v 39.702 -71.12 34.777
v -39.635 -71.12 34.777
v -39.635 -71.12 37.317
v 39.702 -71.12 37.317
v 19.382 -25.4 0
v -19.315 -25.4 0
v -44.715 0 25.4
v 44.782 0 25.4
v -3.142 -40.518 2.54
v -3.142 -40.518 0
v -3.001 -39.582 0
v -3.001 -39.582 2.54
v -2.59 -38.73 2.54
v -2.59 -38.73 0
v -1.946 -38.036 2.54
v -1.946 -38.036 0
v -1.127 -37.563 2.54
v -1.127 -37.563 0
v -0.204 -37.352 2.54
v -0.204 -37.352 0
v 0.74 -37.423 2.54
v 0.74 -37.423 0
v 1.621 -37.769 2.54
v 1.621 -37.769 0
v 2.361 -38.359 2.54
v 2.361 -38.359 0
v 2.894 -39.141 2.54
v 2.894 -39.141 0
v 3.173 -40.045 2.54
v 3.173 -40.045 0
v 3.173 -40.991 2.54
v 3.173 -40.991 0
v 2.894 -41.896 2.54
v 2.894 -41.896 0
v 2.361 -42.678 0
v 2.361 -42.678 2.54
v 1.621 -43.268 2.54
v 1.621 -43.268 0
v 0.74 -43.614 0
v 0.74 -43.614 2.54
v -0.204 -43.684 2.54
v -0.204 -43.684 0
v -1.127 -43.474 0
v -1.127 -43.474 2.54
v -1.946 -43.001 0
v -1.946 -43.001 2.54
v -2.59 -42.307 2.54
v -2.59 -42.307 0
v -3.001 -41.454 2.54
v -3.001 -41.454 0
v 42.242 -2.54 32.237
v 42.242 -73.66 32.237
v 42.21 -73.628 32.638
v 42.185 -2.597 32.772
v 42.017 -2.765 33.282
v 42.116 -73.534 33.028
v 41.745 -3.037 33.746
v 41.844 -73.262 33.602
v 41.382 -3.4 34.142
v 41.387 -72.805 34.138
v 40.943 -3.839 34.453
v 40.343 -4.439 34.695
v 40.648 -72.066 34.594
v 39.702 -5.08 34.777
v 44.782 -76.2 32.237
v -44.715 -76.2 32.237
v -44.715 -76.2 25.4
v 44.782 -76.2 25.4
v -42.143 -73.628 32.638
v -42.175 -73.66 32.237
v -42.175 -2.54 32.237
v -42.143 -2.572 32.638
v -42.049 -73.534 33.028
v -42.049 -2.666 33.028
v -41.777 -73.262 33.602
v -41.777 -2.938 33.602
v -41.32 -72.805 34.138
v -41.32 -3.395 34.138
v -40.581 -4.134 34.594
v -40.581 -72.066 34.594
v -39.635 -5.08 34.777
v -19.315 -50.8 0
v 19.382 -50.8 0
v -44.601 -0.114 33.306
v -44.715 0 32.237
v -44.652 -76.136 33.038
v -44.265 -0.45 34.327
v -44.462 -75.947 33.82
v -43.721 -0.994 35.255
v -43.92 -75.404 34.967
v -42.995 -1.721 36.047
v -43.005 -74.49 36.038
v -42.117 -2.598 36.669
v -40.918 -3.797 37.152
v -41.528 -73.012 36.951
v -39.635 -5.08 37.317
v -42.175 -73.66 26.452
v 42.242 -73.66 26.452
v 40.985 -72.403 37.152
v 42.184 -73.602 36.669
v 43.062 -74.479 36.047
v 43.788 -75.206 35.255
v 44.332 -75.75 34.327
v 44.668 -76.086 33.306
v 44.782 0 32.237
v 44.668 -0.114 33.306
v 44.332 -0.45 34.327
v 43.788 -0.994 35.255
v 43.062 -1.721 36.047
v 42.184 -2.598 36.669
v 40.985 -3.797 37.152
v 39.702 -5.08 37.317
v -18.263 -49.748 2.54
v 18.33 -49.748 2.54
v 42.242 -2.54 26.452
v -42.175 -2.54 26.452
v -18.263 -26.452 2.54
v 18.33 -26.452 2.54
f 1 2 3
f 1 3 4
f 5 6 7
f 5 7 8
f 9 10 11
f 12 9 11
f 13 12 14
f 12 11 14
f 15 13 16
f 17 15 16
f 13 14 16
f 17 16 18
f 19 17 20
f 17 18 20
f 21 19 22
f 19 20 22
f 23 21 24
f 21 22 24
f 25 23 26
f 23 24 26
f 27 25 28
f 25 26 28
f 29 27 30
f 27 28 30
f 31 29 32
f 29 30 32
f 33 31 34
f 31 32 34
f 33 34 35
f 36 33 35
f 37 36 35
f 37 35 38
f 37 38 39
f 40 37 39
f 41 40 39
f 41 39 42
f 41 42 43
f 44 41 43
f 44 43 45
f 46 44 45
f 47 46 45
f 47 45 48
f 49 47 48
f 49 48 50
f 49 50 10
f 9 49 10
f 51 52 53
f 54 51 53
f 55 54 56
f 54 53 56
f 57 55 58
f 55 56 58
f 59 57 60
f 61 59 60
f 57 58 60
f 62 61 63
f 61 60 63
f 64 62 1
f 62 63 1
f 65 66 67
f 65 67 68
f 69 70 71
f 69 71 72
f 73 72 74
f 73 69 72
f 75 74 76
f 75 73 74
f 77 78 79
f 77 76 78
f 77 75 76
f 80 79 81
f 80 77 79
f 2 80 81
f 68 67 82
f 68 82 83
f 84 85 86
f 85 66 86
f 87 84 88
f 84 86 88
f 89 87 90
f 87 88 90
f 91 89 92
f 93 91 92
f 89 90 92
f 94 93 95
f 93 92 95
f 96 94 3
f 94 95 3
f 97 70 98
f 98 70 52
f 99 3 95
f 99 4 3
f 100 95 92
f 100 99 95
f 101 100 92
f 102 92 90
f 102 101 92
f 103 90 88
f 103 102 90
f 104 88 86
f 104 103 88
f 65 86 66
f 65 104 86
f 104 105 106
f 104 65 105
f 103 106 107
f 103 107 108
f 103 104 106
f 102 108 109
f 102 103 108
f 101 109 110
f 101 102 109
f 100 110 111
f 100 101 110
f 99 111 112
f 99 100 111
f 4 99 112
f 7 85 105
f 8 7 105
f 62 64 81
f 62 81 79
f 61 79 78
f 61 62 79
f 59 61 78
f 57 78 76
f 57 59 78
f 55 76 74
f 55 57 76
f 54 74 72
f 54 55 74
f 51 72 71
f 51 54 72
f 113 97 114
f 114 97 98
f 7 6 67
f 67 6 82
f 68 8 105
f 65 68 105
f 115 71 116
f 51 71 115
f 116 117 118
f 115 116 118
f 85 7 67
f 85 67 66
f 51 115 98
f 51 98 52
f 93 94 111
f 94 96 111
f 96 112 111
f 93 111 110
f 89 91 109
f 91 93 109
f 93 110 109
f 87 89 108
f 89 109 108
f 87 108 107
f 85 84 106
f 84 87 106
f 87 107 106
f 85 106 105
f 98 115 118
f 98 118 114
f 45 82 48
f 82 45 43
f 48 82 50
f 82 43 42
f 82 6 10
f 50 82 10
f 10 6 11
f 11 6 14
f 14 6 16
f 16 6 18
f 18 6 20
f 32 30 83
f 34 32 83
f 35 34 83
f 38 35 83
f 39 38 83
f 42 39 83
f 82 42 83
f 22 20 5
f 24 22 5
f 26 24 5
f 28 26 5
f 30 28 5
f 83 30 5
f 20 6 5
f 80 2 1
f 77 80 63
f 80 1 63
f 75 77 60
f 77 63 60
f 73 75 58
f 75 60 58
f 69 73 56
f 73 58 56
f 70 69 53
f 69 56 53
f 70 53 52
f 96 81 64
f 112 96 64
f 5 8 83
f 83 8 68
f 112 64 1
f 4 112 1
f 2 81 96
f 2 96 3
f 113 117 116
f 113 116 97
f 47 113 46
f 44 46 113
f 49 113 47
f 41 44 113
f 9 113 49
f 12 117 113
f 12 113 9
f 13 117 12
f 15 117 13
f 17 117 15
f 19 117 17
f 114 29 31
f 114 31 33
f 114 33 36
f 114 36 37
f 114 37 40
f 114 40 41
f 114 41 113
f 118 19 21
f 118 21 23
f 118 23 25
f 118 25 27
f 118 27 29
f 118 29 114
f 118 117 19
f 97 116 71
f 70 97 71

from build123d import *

# Parameters (mm, degrees)
F0_W     = 89.4973501563
F0_H     = 37.3169183731
F1_DEPTH = 76.2
F2_R     = 5.08
F3_SIZE  = 25.4
F4_T     = -2.54
F6_D     = 6.35


# Not quite as in the source:
# - a shell that OpenCascade refuses in one call is made with other operations: the cavity is built on its own and cut out


with BuildPart() as f1:
    # F0 (on Front) → F1 (new body)
    with BuildSketch(Plane.XZ):
        with Locations((0.0334233046, 18.6584591866)):
            Rectangle(F0_W, F0_H)
    extrude(amount=F1_DEPTH)

    # F2
    f2_edges = [f1.edges().sort_by_distance(p)[0] for p in [
        (44.782098, -38.1, 37.316918),
        (0.033423, -76.2, 37.316918),
        (-44.715252, -38.1, 37.316918),
        (0.033423, 0, 37.316918),
    ]]
    fillet(f2_edges, radius=F2_R)

    # F3
    f3_edges = [f1.edges().sort_by_distance(p)[0] for p in [
        (-44.715252, -38.1, 0),
        (0.033423, 0, 0),
        (44.782098, -38.1, 0),
        (0.033423, -76.2, 0),
    ]]
    chamfer(f3_edges, length=F3_SIZE)

    # F4: a shell. OpenCascade refuses it in one call, so the cavity is built on its own and cut out:
    # the body offset inwards by the wall thickness, plus a prism from it out through each open face.
    f4_core = offset(f1.part, amount=F4_T, mode=Mode.PRIVATE)
    f4_exits = [f4_core.faces().sort_by_distance(p)[0] for p in [
        (0.033423, -38.1, 34.776918),
    ]]
    add(f4_core, mode=Mode.SUBTRACT)
    extrude(f4_exits, amount=-F4_T, mode=Mode.SUBTRACT)

    # F6 (through all)
    with Locations(Plane.XY.offset(2.54)):
        with Locations((0.0334233046, -40.5182316899)):
            Hole(F6_D / 2)


solid = f1.part
